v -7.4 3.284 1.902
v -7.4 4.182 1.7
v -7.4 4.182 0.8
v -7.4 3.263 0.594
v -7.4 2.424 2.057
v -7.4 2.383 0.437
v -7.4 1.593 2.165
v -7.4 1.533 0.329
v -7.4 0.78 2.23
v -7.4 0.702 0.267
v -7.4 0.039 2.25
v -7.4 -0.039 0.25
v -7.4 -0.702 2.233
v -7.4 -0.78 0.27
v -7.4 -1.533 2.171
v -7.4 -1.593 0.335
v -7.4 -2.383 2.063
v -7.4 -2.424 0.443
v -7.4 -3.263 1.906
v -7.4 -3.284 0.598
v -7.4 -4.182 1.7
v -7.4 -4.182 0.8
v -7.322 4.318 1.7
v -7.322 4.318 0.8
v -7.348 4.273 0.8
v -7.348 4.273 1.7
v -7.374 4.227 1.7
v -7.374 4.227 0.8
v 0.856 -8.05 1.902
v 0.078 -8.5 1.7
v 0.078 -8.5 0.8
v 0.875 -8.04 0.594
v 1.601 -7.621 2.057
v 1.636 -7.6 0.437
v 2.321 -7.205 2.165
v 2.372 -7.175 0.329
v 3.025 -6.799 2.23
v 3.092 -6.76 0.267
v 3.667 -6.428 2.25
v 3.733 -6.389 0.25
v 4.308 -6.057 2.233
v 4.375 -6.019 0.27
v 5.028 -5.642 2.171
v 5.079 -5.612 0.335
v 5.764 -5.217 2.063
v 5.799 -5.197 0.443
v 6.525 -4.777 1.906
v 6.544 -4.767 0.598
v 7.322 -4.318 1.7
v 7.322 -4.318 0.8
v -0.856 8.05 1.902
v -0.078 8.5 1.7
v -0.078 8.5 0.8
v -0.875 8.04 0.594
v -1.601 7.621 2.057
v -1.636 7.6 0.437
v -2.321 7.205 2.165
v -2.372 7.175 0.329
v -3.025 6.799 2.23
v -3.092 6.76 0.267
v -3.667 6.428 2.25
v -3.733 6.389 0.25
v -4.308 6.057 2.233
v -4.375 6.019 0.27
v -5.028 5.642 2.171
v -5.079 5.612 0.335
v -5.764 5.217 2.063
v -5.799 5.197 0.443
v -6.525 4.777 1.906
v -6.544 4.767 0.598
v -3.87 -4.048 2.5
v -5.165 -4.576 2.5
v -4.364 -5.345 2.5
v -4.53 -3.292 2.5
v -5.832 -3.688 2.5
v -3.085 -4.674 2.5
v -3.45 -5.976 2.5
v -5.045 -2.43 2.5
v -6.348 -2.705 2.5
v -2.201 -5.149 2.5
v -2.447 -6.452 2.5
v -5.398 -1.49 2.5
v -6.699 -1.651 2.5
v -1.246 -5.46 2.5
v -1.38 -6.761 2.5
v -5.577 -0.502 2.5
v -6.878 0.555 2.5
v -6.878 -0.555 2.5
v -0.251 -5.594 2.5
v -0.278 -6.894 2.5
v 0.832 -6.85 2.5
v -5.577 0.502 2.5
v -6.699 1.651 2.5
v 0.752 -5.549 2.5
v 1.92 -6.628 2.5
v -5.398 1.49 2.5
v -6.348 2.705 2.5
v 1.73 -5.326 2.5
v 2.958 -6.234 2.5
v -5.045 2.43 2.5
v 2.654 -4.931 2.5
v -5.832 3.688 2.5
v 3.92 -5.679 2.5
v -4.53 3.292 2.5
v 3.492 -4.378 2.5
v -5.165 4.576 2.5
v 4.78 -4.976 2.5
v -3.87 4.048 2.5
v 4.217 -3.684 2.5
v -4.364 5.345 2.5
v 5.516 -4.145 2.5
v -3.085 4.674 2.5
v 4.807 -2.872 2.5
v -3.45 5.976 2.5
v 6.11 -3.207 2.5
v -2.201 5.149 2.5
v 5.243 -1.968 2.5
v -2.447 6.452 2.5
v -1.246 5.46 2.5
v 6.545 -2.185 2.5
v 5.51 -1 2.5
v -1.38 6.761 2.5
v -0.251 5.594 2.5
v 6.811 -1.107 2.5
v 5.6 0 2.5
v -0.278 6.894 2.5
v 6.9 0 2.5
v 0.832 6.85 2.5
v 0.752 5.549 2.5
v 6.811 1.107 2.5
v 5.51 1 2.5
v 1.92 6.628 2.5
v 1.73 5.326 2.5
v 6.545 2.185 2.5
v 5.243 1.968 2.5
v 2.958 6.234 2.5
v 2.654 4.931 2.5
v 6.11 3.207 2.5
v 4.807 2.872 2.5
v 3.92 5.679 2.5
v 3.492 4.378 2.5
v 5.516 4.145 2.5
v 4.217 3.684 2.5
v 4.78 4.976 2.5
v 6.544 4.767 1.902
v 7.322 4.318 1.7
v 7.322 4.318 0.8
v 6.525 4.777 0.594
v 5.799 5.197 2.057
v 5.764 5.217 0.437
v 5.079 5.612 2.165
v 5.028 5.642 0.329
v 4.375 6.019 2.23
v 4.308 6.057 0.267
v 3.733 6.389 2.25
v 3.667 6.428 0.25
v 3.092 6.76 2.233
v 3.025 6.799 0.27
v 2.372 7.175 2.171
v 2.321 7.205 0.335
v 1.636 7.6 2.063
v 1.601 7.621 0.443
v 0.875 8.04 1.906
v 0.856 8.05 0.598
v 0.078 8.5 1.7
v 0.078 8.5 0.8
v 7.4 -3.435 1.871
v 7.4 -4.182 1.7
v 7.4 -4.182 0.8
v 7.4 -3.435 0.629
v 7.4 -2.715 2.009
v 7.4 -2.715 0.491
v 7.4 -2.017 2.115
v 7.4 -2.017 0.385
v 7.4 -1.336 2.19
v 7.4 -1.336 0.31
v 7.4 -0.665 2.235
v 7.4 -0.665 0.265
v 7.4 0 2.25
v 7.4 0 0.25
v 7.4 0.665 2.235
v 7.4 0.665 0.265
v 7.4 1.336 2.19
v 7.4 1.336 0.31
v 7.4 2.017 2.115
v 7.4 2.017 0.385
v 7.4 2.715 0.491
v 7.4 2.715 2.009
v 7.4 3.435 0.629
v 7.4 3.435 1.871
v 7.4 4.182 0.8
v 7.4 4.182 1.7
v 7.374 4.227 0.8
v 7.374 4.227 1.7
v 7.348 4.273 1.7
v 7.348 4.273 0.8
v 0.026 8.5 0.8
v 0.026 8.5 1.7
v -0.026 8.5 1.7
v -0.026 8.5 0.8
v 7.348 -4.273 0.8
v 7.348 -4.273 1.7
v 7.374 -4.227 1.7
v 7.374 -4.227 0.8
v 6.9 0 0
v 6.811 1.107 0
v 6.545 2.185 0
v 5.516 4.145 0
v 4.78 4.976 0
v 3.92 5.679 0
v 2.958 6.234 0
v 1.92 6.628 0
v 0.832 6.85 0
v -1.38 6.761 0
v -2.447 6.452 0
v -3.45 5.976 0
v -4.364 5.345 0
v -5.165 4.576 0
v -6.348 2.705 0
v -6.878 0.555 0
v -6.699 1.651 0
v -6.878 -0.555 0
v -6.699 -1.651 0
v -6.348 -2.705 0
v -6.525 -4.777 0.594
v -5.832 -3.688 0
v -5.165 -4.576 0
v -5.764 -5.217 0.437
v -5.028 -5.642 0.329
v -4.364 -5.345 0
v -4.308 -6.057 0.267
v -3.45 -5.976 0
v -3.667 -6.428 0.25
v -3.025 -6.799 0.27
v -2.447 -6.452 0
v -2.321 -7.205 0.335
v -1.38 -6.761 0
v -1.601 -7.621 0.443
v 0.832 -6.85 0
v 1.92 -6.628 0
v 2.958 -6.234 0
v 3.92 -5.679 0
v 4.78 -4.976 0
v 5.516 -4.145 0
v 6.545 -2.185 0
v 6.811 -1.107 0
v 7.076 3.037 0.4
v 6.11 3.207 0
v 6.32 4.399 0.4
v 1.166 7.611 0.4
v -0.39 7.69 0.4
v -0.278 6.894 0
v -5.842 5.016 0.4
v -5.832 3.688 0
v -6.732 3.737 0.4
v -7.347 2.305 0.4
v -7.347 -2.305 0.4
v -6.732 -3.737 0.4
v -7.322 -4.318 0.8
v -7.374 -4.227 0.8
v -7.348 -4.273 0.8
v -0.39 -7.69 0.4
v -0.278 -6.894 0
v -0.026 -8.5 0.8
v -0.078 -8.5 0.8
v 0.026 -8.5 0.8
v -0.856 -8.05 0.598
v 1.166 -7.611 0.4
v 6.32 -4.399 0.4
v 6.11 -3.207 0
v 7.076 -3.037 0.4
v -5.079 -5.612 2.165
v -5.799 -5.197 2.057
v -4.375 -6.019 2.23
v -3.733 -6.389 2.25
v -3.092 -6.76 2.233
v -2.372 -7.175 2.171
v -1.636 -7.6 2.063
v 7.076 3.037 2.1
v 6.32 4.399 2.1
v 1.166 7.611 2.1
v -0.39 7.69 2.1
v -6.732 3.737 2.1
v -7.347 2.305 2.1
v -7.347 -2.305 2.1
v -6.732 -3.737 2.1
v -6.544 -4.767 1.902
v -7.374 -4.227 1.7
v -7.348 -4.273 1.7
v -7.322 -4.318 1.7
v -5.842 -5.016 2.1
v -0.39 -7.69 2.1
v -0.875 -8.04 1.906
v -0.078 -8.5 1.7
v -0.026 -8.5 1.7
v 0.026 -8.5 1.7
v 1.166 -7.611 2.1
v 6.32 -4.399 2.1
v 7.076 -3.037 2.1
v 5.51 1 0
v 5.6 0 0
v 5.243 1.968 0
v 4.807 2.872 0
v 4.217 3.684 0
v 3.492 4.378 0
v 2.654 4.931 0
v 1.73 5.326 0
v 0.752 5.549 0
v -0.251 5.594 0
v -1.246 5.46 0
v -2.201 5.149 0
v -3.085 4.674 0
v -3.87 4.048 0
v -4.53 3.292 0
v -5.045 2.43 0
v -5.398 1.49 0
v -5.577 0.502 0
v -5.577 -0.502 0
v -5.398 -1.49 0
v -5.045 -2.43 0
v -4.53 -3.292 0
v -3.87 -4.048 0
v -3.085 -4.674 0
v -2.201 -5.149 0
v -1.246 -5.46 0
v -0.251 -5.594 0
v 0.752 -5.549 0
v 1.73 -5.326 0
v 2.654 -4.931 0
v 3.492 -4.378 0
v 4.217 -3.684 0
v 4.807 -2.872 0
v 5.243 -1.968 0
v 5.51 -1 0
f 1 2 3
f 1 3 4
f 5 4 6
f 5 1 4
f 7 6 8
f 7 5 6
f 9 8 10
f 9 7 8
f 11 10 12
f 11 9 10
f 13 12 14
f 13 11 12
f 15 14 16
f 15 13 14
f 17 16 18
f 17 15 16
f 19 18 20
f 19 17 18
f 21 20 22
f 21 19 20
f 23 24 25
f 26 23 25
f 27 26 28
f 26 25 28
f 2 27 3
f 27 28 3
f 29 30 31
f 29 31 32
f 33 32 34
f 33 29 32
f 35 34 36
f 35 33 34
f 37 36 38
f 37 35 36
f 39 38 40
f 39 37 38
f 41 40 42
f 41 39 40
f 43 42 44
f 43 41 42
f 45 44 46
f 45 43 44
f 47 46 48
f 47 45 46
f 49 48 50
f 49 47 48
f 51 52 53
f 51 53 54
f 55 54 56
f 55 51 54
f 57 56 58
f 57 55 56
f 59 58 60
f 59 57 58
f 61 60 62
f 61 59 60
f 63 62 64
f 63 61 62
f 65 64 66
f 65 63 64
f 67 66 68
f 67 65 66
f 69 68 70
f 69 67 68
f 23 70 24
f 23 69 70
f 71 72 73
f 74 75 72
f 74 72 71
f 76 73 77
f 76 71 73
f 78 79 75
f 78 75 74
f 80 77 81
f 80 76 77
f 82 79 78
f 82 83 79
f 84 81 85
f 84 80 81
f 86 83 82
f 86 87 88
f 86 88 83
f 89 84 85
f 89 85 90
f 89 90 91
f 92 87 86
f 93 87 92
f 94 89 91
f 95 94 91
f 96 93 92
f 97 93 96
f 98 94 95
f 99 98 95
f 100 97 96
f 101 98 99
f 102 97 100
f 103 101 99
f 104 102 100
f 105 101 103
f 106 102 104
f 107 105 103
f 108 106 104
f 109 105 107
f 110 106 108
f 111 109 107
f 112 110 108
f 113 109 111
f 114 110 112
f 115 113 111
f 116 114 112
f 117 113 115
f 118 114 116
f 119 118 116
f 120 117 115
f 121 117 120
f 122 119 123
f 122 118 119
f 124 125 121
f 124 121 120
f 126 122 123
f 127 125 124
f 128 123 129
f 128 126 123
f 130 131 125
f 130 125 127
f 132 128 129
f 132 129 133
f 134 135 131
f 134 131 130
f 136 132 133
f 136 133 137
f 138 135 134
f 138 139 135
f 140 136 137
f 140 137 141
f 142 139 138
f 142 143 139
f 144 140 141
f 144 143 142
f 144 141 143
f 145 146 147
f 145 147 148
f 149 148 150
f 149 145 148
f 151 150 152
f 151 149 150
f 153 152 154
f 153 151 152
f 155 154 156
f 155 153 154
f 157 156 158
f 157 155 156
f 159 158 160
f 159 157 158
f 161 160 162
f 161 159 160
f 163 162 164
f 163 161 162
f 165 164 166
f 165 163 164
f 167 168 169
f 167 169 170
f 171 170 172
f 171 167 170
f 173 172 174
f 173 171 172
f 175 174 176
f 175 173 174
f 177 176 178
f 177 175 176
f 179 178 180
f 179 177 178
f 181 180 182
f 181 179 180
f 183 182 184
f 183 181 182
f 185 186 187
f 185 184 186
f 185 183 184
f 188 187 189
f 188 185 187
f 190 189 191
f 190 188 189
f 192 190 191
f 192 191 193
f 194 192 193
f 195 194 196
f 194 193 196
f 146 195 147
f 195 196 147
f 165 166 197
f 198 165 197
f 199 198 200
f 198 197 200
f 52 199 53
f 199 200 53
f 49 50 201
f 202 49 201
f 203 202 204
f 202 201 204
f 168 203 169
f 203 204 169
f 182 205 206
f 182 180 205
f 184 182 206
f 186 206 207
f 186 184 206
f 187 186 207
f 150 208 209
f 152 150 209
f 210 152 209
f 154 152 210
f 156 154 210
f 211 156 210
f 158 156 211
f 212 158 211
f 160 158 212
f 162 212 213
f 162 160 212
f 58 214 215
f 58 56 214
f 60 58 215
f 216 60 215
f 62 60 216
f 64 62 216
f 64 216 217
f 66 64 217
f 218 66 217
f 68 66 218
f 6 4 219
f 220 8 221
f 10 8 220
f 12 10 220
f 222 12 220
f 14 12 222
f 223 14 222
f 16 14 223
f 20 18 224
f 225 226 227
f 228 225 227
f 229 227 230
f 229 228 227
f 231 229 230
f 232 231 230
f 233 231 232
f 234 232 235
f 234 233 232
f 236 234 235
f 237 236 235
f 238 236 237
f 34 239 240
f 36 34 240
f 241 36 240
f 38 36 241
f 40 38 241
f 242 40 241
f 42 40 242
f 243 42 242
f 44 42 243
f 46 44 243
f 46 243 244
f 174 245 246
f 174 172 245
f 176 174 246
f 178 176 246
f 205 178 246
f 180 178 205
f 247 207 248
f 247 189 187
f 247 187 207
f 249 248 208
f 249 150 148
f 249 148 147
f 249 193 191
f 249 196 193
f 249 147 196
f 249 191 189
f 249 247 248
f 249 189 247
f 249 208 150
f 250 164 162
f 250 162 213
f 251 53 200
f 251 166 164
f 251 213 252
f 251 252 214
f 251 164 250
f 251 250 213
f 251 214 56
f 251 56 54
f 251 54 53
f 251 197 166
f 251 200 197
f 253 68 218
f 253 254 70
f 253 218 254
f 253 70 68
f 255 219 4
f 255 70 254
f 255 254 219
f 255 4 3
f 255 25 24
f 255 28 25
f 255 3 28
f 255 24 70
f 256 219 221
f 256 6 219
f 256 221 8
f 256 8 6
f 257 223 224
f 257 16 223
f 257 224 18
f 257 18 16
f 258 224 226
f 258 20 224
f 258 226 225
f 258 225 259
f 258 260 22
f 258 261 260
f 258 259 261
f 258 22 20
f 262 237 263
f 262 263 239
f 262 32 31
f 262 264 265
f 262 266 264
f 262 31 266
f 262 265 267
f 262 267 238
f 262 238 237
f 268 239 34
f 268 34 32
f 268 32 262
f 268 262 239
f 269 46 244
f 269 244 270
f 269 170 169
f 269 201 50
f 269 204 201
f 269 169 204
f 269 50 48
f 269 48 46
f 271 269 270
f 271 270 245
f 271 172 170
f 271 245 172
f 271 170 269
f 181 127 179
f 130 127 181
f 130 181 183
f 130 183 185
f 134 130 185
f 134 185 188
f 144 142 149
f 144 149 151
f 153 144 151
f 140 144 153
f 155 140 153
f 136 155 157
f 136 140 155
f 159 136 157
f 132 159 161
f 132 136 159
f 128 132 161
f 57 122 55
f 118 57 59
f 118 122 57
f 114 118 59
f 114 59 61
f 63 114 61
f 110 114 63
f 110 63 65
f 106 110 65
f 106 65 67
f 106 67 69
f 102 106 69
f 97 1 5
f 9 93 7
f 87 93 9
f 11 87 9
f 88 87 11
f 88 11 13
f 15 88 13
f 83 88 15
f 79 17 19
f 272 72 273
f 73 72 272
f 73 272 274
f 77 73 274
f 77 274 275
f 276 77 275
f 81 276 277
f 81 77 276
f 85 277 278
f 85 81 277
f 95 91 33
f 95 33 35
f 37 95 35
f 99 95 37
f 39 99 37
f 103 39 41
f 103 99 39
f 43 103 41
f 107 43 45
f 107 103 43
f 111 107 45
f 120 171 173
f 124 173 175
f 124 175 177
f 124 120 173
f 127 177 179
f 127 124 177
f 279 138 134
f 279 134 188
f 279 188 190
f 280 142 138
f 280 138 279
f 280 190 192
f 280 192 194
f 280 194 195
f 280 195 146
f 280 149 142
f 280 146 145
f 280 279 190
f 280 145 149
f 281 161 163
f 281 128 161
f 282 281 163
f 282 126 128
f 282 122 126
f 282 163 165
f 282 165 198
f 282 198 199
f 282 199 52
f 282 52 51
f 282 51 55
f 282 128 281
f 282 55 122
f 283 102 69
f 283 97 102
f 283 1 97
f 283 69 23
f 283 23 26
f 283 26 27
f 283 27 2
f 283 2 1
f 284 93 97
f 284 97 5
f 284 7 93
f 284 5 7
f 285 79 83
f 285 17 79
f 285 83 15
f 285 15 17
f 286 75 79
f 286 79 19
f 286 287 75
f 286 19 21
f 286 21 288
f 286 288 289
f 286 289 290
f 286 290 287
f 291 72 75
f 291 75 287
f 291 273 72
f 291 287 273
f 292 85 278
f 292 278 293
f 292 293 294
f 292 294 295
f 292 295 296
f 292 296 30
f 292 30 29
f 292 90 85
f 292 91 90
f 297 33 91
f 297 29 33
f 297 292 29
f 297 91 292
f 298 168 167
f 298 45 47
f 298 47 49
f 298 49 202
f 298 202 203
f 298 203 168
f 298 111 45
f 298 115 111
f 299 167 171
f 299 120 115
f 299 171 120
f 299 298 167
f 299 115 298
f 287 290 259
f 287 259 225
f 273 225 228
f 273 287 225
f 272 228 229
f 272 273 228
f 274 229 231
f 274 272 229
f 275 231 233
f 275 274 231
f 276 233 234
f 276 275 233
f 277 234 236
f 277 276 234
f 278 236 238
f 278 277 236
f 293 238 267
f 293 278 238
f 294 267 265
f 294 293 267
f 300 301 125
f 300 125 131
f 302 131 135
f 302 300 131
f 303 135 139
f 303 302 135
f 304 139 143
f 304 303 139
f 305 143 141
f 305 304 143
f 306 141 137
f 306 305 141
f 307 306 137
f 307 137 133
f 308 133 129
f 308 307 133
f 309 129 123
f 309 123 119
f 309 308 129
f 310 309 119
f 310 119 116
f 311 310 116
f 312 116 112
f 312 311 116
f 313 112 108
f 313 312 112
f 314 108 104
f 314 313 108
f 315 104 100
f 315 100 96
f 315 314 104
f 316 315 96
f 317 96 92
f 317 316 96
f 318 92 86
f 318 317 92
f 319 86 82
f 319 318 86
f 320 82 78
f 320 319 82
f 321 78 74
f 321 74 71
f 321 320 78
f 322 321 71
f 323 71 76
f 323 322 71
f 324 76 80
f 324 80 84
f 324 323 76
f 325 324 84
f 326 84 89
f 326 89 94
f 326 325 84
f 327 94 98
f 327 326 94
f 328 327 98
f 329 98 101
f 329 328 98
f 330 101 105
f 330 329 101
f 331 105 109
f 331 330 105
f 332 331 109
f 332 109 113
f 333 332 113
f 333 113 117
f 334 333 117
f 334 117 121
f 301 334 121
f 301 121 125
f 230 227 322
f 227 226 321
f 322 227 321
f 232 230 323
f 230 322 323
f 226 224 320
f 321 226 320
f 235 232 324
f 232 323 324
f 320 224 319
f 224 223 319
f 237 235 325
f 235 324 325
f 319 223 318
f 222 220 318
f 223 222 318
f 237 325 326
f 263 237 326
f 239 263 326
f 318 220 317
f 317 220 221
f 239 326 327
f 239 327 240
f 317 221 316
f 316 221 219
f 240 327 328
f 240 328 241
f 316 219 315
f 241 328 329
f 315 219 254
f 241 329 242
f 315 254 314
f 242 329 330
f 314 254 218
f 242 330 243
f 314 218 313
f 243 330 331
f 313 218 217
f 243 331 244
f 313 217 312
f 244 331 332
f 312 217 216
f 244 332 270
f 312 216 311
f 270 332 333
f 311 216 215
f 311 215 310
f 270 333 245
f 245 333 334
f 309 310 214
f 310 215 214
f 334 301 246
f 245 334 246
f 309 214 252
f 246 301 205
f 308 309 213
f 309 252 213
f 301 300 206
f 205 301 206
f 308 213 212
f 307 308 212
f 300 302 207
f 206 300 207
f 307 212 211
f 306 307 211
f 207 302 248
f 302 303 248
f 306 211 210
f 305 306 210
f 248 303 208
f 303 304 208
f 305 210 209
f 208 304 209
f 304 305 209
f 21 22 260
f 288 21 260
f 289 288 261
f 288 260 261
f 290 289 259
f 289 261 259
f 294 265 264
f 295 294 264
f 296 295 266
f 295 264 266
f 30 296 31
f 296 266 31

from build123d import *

# Parameters (mm, degrees)
SKETCH_3_R          = 8.5
SKETCH_3_R_2        = 5.6
EXTRUDE_2_DEPTH     = 2.5
CHAMFER_1_SIZE      = 0.8
CHAMFER_1_SIZE2     = 1.6
CHAMFER_2_SIZE      = 1.6
CHAMFER_2_SIZE2     = 0.8
SKETCH_4_OUTSIDE_W  = 23.834
SKETCH_4_OUTSIDE_H  = 23.834
CUT_EXTRUDE_3_DEPTH = 13.278029158


with BuildPart() as part:
    # Эскиз3 → Вытянуть2 (new body)
    with BuildSketch(Plane.XY):
        Circle(SKETCH_3_R)
        Circle(SKETCH_3_R_2, mode=Mode.SUBTRACT)
    extrude(amount=EXTRUDE_2_DEPTH)

    # Фаска1
    chamfer_1_edges = [part.edges().sort_by_distance(p)[0] for p in [
        (-8.5, 0, 2.5),
    ]]
    chamfer_1_side = [part.faces().sort_by_distance(p)[0] for p in [
        (-8.5, 0, 1.25),
    ]]
    chamfer(chamfer_1_edges, length=CHAMFER_1_SIZE, length2=CHAMFER_1_SIZE2, reference=chamfer_1_side[0])

    # Фаска2
    chamfer_2_edges = [part.edges().sort_by_distance(p)[0] for p in [
        (-8.5, 0, 0),
    ]]
    chamfer_2_side = [part.faces().sort_by_distance(p)[0] for p in [
        (-8.259583694, 0, 0),
    ]]
    chamfer(chamfer_2_edges, length=CHAMFER_2_SIZE, length2=CHAMFER_2_SIZE2, reference=chamfer_2_side[0])

    # Эскиз4 outside → Вытянуть3 (cut, through all)
    with BuildSketch(Plane.XY.offset(2.5)):
        Rectangle(SKETCH_4_OUTSIDE_W, SKETCH_4_OUTSIDE_H)
        Polygon((0, 8.544783984), (-7.4, 4.272391992), (-7.4, -4.272391992), (0, -8.544783984), (7.4, -4.272391992), (7.4, 4.272391992), align=None, mode=Mode.SUBTRACT)
    extrude(amount=-CUT_EXTRUDE_3_DEPTH, mode=Mode.SUBTRACT)


solid = part.part
